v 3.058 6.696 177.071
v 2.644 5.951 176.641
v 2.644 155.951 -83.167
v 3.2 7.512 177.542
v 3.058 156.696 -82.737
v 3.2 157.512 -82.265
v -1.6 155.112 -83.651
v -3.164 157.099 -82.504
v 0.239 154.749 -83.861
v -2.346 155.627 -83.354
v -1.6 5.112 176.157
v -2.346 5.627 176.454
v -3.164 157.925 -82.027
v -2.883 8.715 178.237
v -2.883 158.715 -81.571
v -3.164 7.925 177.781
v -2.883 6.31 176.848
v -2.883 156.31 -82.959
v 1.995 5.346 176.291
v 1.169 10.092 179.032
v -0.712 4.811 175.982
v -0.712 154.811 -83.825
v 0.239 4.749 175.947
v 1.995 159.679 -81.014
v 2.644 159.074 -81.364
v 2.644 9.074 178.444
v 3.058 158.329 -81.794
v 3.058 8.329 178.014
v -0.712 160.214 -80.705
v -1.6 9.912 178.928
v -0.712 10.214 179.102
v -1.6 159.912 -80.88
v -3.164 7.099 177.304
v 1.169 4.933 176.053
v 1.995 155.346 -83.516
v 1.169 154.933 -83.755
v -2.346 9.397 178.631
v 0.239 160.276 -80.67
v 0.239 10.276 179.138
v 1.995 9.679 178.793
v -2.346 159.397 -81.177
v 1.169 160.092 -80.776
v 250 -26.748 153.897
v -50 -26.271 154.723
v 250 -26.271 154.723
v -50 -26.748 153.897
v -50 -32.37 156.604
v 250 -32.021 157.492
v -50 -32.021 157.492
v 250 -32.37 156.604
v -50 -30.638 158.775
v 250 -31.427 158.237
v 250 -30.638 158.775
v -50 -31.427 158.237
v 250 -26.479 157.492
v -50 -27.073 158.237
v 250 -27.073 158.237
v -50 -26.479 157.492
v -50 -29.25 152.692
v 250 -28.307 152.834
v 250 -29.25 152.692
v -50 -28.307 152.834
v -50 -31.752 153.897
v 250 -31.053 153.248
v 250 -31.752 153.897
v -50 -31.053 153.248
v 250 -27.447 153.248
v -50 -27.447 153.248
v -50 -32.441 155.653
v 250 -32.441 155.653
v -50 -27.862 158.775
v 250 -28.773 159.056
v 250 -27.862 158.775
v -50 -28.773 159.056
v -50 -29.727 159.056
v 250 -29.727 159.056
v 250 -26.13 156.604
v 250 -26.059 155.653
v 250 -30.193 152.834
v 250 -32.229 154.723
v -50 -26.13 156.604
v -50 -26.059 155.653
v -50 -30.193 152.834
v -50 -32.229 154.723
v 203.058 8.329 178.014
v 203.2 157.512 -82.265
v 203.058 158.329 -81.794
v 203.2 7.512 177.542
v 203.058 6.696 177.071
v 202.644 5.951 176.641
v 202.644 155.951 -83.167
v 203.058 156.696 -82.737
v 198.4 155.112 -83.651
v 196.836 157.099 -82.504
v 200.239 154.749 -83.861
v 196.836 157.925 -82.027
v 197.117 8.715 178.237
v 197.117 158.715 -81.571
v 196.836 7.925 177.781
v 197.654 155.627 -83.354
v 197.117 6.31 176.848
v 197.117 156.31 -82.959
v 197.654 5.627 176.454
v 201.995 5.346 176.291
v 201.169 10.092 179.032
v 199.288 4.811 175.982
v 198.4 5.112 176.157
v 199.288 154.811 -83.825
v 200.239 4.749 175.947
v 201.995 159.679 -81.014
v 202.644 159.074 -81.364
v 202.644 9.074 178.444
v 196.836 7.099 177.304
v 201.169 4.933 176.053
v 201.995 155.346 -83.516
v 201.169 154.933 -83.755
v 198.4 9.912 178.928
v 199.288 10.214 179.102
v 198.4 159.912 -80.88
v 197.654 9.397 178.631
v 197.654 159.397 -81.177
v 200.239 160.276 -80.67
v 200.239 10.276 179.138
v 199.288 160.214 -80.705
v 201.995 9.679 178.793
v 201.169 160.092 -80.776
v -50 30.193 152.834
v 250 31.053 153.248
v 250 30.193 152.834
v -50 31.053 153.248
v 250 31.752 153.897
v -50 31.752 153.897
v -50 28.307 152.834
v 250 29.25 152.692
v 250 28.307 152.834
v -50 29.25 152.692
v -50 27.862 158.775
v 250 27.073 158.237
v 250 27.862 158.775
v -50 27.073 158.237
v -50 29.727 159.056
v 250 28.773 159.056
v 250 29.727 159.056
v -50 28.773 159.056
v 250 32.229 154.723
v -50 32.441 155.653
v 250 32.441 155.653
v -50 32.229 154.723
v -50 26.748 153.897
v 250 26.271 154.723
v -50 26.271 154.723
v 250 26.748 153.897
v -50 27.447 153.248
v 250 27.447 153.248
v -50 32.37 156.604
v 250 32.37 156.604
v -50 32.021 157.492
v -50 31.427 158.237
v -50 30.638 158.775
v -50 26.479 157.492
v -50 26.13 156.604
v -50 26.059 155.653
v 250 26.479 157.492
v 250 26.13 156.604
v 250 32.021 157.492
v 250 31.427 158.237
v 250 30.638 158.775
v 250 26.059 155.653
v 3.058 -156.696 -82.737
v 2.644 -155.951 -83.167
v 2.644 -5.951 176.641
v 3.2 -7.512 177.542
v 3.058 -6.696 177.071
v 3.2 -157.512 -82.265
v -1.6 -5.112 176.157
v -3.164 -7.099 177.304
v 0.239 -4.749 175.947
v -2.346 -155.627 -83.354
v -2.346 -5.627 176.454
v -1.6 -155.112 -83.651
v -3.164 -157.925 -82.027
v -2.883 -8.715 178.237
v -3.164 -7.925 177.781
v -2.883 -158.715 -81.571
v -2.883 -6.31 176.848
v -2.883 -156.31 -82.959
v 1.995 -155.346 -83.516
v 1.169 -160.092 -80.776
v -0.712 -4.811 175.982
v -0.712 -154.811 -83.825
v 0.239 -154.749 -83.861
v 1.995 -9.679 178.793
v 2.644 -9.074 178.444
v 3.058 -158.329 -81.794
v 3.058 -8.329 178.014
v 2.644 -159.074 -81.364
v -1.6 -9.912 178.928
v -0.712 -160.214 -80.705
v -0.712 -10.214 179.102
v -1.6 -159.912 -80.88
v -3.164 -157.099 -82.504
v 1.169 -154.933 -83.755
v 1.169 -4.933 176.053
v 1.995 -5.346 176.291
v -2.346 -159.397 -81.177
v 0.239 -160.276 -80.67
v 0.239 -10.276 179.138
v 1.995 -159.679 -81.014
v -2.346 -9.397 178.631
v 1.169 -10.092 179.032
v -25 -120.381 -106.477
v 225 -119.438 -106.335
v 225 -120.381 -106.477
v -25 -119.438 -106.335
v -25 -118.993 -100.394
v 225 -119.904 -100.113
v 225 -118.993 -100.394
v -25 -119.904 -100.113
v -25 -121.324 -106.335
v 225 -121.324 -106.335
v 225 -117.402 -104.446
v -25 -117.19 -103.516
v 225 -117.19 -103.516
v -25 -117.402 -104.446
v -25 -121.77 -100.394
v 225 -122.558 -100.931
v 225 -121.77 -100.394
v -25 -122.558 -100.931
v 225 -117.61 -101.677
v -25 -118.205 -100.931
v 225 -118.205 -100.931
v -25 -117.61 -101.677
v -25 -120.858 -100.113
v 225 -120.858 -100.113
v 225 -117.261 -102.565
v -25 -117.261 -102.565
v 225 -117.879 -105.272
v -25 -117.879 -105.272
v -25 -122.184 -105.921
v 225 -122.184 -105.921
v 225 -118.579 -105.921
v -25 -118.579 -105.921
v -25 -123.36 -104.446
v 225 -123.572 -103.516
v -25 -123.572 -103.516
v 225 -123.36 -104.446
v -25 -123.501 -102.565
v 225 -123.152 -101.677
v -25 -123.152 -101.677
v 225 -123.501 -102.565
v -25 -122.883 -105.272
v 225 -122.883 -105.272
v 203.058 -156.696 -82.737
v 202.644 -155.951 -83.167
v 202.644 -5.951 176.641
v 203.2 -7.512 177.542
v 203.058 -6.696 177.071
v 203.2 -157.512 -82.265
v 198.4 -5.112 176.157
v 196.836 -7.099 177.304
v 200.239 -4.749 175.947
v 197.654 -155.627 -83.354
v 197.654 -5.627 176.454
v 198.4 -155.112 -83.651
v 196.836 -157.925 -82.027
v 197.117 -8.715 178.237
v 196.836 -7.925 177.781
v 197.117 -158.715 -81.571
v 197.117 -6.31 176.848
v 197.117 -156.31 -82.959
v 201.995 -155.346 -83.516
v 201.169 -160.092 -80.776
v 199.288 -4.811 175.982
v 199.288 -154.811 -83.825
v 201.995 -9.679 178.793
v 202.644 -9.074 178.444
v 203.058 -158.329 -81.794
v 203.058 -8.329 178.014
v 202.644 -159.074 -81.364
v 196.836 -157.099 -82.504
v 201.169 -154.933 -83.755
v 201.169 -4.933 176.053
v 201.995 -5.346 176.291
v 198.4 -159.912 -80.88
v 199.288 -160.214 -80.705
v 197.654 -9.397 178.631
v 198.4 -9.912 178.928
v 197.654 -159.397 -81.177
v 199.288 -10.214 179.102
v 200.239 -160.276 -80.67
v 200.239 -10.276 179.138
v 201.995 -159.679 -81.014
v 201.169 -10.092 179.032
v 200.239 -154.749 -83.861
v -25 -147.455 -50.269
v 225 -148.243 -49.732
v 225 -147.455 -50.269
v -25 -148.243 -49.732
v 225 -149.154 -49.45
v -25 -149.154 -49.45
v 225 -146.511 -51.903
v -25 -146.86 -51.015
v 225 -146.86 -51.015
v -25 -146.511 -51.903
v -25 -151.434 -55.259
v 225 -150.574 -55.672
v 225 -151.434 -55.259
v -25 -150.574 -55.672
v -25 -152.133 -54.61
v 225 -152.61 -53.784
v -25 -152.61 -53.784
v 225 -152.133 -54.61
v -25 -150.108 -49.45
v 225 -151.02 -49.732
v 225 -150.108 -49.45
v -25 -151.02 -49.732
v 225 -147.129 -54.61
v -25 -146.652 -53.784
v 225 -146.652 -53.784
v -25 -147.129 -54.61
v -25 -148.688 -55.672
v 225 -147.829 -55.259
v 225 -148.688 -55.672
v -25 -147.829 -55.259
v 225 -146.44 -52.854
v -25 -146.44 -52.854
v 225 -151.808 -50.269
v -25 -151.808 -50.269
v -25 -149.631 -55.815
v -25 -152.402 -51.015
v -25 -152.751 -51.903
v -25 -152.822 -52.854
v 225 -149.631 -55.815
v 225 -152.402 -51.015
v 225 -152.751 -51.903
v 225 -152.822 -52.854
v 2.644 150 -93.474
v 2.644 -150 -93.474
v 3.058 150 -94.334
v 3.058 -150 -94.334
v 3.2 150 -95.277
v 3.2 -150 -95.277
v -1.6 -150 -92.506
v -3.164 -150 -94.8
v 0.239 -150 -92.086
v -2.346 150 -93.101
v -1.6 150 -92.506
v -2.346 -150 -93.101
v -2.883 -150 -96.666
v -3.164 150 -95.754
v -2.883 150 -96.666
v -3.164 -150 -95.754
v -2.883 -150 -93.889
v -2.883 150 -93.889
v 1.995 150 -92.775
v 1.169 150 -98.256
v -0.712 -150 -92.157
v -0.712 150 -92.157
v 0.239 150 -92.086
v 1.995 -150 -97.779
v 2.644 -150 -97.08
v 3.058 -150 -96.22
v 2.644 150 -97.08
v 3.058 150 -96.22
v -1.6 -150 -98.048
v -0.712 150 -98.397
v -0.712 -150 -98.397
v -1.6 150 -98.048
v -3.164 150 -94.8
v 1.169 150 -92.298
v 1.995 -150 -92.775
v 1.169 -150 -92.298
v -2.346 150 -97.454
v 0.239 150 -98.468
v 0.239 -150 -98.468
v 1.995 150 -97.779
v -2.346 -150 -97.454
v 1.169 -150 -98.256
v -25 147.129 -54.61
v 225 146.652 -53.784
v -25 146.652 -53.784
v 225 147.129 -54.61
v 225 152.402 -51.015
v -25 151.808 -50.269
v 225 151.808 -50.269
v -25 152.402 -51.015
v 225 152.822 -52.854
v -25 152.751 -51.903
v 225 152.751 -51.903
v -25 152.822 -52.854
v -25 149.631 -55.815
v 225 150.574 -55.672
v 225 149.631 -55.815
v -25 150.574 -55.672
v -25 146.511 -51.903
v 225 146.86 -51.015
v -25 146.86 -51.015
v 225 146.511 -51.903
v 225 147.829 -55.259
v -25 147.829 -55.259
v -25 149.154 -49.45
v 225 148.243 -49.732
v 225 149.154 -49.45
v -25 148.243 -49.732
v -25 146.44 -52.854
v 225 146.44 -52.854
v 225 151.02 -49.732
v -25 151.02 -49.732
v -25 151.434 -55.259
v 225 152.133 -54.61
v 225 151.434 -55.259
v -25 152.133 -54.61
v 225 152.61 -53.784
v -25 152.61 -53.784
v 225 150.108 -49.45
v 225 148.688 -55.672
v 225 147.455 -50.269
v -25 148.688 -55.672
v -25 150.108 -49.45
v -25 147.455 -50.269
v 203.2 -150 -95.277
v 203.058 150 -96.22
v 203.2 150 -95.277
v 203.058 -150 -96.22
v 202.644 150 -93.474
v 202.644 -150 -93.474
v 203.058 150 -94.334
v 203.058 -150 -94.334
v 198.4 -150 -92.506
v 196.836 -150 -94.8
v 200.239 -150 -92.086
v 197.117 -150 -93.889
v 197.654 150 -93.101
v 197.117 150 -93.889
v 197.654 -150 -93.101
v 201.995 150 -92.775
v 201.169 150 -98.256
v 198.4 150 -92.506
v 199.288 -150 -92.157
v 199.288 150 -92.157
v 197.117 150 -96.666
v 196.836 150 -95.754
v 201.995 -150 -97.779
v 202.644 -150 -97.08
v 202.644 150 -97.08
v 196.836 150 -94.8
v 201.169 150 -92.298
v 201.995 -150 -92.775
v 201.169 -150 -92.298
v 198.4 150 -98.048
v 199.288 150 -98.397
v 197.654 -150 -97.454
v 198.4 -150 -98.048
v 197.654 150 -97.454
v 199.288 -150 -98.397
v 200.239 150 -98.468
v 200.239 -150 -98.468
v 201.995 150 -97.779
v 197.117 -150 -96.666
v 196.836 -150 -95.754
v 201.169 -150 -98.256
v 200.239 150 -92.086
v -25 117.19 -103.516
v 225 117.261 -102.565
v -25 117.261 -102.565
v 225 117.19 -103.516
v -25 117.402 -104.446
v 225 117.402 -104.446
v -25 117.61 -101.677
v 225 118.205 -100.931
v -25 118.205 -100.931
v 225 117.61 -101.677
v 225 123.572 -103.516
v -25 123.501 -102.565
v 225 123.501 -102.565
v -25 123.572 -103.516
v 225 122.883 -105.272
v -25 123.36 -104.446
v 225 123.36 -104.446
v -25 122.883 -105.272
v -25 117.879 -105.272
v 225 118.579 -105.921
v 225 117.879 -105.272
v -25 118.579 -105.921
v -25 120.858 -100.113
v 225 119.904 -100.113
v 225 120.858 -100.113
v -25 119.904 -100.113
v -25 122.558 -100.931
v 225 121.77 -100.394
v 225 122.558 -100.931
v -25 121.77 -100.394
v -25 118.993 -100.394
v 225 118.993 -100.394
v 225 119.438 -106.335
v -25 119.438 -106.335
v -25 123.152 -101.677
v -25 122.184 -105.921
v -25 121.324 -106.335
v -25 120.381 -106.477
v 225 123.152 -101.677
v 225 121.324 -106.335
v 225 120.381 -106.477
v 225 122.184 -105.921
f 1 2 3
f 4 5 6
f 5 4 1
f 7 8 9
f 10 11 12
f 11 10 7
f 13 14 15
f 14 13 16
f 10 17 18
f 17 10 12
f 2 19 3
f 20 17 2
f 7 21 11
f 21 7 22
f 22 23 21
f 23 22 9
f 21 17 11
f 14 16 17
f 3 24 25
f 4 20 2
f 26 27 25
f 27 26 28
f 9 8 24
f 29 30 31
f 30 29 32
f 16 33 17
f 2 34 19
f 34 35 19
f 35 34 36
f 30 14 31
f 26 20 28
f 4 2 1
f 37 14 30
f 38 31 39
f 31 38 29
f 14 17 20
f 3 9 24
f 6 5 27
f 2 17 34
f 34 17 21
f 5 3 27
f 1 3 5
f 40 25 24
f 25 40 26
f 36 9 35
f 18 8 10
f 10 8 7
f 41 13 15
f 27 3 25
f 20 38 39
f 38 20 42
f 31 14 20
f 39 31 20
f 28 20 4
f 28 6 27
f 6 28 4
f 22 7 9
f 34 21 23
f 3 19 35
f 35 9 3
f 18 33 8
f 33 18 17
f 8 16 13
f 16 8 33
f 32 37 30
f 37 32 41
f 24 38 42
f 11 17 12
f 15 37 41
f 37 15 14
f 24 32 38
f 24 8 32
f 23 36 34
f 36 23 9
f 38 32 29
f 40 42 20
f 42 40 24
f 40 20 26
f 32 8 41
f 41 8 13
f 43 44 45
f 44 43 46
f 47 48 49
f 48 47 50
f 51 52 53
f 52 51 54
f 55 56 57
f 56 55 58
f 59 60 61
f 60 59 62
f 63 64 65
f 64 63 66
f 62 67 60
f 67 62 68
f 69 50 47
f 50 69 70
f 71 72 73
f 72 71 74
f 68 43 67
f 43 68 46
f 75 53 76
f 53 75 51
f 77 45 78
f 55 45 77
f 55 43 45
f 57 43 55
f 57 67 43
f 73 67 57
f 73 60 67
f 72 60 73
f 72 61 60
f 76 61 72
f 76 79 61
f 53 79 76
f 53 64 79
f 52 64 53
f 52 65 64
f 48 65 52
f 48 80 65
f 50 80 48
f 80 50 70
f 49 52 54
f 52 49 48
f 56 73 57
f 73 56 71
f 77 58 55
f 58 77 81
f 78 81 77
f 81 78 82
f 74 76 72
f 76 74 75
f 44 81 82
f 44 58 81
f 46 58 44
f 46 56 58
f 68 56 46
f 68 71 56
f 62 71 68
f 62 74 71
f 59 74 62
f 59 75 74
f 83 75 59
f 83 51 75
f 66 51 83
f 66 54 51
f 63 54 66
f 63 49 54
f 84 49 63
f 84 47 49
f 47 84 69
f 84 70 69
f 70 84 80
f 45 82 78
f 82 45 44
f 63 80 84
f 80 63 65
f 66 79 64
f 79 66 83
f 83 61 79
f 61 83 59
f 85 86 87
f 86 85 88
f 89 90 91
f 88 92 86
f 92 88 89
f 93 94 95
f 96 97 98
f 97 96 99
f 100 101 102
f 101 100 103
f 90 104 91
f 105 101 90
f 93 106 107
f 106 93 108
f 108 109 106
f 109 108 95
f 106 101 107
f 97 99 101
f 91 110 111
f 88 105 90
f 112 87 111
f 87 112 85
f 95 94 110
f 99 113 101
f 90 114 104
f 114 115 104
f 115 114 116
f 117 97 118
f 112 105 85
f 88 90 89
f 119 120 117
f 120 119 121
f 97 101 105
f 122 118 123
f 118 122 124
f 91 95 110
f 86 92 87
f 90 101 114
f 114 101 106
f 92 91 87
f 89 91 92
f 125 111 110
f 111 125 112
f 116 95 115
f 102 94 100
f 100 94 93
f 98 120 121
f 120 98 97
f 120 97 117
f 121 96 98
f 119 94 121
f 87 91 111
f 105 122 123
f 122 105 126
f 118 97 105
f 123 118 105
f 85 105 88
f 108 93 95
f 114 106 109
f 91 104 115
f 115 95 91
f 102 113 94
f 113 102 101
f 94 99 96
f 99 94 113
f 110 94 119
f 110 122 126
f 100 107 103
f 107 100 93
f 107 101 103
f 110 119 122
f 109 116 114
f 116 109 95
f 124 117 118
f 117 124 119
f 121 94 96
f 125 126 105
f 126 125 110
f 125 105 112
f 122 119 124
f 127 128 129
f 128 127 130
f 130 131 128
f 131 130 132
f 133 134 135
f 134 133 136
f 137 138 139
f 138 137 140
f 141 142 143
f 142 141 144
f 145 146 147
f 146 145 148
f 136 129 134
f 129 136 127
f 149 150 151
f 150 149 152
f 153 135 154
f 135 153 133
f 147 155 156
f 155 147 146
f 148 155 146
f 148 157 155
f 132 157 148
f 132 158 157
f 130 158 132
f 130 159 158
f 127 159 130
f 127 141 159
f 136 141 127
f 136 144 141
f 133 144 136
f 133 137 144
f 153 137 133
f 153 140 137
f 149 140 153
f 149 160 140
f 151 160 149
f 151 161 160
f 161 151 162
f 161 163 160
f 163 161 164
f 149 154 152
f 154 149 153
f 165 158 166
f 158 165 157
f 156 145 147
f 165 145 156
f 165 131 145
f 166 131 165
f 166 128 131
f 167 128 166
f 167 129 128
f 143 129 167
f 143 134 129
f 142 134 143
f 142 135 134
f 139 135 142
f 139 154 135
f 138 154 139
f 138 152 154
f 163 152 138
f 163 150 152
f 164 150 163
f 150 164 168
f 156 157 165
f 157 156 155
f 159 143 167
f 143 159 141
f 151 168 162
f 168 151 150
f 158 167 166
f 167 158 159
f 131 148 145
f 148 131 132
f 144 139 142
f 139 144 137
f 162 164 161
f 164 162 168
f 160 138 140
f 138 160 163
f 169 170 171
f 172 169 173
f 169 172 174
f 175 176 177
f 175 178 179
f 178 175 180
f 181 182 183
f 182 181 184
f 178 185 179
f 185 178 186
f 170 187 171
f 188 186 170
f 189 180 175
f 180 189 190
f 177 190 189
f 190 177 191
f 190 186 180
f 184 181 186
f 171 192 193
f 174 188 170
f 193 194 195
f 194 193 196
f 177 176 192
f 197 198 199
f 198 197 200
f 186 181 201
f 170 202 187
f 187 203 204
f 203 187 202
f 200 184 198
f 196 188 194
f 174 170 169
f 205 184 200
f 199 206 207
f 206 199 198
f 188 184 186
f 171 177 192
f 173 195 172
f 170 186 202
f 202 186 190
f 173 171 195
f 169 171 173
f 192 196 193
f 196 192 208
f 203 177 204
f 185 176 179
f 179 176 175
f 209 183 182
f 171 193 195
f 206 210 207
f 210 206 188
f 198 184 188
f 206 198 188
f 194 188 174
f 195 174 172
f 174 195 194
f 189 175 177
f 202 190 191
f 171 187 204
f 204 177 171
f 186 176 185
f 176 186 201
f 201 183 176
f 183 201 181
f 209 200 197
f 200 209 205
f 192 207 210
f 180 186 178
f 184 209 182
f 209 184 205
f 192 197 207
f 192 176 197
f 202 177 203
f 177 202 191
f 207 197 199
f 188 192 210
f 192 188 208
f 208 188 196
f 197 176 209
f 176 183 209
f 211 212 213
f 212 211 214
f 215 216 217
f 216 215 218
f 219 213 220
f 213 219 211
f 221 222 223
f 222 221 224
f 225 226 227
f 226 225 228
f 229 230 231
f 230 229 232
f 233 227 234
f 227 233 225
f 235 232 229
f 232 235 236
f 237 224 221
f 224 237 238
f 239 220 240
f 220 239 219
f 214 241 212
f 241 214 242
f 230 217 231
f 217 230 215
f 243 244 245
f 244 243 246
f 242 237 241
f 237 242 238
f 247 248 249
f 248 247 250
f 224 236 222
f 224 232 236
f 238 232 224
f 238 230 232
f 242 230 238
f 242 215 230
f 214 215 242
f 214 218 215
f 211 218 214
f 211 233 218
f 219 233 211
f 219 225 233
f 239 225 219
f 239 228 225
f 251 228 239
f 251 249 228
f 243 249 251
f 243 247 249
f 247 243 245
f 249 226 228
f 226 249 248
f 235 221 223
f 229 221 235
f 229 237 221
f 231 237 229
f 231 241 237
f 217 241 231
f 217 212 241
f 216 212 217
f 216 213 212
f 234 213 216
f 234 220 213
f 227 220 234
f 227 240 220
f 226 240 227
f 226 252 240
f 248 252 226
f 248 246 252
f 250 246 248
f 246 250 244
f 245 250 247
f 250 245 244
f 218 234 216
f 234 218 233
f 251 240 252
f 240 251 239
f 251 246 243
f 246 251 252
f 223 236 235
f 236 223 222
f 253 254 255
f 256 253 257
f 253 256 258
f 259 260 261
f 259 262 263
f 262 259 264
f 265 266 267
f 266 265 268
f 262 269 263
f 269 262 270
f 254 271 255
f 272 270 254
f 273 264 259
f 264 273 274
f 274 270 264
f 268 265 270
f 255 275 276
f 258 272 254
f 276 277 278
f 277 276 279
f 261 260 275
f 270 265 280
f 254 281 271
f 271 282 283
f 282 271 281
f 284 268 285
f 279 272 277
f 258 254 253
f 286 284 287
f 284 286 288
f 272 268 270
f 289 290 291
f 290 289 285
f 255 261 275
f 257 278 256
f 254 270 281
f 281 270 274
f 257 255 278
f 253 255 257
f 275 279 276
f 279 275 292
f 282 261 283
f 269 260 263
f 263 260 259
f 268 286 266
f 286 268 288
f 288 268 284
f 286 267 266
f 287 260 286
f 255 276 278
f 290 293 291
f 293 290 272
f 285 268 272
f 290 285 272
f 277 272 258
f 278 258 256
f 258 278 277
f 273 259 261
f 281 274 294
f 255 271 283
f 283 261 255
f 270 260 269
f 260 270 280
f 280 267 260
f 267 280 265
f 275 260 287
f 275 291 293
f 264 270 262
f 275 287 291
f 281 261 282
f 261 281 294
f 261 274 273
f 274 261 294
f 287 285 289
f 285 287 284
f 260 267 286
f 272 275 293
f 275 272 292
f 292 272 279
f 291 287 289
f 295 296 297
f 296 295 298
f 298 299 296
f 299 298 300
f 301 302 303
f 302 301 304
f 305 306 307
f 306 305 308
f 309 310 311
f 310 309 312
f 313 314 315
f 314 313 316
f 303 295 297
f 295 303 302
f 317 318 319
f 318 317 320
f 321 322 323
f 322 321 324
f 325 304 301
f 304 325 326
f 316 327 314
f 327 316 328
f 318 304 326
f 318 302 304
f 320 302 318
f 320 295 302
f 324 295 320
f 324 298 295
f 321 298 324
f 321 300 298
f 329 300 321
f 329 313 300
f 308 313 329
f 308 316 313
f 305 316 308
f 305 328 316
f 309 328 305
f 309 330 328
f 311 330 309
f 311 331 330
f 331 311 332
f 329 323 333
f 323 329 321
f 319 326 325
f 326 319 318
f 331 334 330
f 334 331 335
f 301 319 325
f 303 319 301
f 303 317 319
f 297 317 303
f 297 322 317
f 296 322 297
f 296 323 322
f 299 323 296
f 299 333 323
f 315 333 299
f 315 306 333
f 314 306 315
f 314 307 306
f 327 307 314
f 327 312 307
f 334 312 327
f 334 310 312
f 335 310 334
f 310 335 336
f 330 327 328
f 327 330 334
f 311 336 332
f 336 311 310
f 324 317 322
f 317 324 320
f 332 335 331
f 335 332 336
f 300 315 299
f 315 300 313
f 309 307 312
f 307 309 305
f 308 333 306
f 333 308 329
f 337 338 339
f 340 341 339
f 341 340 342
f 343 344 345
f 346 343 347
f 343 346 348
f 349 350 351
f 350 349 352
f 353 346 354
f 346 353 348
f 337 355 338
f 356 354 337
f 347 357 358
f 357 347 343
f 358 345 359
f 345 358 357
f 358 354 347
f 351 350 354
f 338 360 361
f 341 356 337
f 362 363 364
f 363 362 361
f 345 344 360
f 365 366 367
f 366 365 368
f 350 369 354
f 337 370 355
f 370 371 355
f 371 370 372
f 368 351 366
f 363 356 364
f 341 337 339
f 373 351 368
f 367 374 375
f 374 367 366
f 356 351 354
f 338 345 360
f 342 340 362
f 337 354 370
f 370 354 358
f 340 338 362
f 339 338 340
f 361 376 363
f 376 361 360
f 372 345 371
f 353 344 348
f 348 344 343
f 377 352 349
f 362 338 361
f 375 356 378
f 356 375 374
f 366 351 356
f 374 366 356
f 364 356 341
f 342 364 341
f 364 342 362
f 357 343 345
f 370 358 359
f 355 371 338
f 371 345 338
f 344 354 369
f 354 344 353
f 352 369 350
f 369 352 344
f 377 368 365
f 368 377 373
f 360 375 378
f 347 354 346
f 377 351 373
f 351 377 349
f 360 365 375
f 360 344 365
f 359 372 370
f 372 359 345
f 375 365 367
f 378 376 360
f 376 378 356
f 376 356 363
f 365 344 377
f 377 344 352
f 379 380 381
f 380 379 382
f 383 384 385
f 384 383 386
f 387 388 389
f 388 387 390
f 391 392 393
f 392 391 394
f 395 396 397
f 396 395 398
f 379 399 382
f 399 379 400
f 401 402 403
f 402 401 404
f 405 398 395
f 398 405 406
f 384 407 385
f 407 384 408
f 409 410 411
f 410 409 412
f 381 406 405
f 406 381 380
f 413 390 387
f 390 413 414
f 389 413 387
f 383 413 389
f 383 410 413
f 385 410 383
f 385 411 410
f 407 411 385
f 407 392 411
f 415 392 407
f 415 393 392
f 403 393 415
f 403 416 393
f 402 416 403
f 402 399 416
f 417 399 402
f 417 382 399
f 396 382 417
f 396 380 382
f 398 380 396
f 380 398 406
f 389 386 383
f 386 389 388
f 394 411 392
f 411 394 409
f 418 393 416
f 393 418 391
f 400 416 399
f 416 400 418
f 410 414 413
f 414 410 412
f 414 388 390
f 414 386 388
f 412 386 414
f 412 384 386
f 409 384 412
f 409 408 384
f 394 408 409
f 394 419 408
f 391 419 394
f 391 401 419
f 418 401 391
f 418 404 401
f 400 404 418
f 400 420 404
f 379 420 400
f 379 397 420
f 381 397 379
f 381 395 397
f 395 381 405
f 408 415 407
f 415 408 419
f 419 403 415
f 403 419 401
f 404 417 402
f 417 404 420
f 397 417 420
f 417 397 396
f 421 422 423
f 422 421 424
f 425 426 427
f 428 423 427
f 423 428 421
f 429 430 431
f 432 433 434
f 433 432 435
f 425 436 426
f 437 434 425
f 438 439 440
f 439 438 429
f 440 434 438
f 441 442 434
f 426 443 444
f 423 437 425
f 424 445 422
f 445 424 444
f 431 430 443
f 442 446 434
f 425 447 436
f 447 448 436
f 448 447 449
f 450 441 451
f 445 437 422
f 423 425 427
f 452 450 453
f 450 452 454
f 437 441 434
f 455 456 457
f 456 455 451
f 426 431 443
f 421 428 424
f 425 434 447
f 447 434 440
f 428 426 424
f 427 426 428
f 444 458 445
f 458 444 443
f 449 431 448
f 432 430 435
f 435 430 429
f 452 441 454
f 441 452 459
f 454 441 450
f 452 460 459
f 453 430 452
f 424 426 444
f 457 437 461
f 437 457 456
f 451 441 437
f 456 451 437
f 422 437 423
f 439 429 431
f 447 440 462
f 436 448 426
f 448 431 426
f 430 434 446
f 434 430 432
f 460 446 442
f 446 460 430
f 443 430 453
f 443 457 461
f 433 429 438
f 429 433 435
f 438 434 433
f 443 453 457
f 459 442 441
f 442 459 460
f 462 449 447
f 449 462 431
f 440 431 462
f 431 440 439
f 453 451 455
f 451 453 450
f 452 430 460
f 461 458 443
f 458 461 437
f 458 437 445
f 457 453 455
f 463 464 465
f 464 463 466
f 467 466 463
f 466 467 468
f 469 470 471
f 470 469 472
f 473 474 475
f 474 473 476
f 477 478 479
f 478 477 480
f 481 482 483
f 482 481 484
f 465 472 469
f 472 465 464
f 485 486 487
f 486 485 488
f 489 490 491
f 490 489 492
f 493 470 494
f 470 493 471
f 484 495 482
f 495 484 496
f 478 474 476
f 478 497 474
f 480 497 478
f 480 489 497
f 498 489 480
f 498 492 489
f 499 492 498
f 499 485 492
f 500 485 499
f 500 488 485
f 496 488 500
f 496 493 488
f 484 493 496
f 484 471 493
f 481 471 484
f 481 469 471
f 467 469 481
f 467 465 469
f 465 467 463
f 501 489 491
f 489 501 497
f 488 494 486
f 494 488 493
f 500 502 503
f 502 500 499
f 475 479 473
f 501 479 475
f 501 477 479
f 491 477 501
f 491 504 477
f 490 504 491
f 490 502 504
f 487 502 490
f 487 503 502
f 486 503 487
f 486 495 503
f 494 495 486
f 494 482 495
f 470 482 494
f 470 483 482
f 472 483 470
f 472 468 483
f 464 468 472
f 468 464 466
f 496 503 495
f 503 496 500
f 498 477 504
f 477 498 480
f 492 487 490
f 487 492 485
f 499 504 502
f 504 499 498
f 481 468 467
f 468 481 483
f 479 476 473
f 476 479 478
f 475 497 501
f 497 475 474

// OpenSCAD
// file: vitamin/rod.scad
/*
 * rod
 *
 * Copyright 2013 <b@Zi.iS>
 * License CC BY 3.0
 */

include <../config.scad>;

rod();

module rod(
	r = 8/2,
	h = 250
) {
	echo("Smooth rod ", r*2, "mm x ", h, "mm");
	color(color_steal) {
		cylinder(
			r = r,
			h = h
		);
	}
}

module threaded_rod(
	r = 8/2,
	h = 250,
	pitch = 1.26,
) {
	echo("Threaded rod ", r*2, "mm x ", h, "mm");
	color([.7,.7,.7]) {
		cylinder(
			r = r*.8,
			h = h
		);
		%cylinder(
			r = r,
			h = h
		);
	}

	/* Proper version but too slow
	color(color_steal) {
		linear_extrude(
			height = h,
			twist = -h/pitch*360
		) {
			translate([.866*pitch,0,0]) {
				circle(
					r=r 
				);
			}
		}
	}*/
}
// file: config.scad
/*
 * config
 *
 * Copyright 2013 <b@Zi.iS>
 * License CC BY 3.0
 */

$fa = 1;
$fs = 1;
preview = 1;

// preview colors
color_steal = [.8,.8,.8];
color_wood = [.3,.3,0];
color_print = [0,.8,0];

// metric bolt sizes
function m_hole(size) = size*1.1/2;
function m_pilot(size) = size*.9/2;

mounting_bolt = 3;

// slightly move and slightly elongate objects in preview to overcome scad rounding errors
module e() {
	if(preview==1) {
		translate([
			0,
			0,
			-.1
		]) {
			scale([
				1,
				1,
				1.1
			]) {
				child();
			}
		}
	} else {
		child();
	}
}

module m_washer(
	size = 3
) {
	color(color_steal) {
		difference() {
			cylinder(
				r = size/2*2,
				h = size*.2
			);
			e() cylinder(
				r = size/2,
				h = size*.2
			);
		}
	}
	translate([
		0,
		0,
		size*.2
	]) {
		child();
	}
}

module m_nut(
	size = 3
) {
	color(color_steal) {
		difference() {
			cylinder(
				r = size*1.8/2,
				h = size*.8,
				$fn = 6
			);
		}
	}
	translate([
		0,
		0,
		size*.8
	]) {
		child();
	}
}

module m_nylock(
	size = 3
) {
	color(color_steal) {
		difference() {
			cylinder(
				r = size*1.8/2,
				h = size,
				$fn = 6
			);
		}
	}
	translate([
		0,
		0,
		size
	]) {
		child();
	}
}

module screw(
	r = 1,
	h = 1,
	pitch = 5,
) {
	linear_extrude(
		height = h,
		twist = -h/pitch*360
	) {
		translate([pitch/5,0,0]) { //H=.2*p works better in plastic then ISO's H=.866*p
			circle(
				r=r 
			);
		}
	}
}

fan40 = [
	40,			//width/length
	10,			//height
	32,			//bolt pitch
	3,			//bolt
];

lm8uu = [
	15.2/2,	//outside
	8/2,	//inside
	26,		//length
];
// main file
/*
 * frame
 *
 * Copyright 2013 <b@Zi.iS>
 * License CC BY 3.0
 */

include <config.scad>
use <vitamin/rod.scad>

frame();

module frame(
	rod = 8,
	small_pitch = 58.5,
	large_pitch = 250,
	x_pitch = 200,
	ends = 25
) {
	tri = small_pitch - rod/cos(30) * 2; //Amount triangles extend behond cross-rods
	length = large_pitch + tri*2;
	
	for(i=[0:2]) {
		for(x=[0:1]) {
			rotate([
				360/3*i,
				0,
				0,
			]) {
				translate([
					x_pitch*x,
					0,
					length/2/cos(30)
				]) {
					rotate([
						-150,
						0,
						0,
					]) {
						translate([
							0,
							0,
							tri - ends
						]) {
							threaded_rod(
								h = large_pitch + ends*2
							);
						}
					}
				}
				translate([
					-ends -(i==0 ? ends : 0),
					-small_pitch/2 + small_pitch*x,
					length/2/cos(30) - (tri/2)/tan(30)
				]) {
					rotate([
						0,
						90,
						0,
					]) {
						threaded_rod(h=x_pitch + ends*2 +(i==0 ? 50 : 0));
					}
				}
			}
		}
	}
}
